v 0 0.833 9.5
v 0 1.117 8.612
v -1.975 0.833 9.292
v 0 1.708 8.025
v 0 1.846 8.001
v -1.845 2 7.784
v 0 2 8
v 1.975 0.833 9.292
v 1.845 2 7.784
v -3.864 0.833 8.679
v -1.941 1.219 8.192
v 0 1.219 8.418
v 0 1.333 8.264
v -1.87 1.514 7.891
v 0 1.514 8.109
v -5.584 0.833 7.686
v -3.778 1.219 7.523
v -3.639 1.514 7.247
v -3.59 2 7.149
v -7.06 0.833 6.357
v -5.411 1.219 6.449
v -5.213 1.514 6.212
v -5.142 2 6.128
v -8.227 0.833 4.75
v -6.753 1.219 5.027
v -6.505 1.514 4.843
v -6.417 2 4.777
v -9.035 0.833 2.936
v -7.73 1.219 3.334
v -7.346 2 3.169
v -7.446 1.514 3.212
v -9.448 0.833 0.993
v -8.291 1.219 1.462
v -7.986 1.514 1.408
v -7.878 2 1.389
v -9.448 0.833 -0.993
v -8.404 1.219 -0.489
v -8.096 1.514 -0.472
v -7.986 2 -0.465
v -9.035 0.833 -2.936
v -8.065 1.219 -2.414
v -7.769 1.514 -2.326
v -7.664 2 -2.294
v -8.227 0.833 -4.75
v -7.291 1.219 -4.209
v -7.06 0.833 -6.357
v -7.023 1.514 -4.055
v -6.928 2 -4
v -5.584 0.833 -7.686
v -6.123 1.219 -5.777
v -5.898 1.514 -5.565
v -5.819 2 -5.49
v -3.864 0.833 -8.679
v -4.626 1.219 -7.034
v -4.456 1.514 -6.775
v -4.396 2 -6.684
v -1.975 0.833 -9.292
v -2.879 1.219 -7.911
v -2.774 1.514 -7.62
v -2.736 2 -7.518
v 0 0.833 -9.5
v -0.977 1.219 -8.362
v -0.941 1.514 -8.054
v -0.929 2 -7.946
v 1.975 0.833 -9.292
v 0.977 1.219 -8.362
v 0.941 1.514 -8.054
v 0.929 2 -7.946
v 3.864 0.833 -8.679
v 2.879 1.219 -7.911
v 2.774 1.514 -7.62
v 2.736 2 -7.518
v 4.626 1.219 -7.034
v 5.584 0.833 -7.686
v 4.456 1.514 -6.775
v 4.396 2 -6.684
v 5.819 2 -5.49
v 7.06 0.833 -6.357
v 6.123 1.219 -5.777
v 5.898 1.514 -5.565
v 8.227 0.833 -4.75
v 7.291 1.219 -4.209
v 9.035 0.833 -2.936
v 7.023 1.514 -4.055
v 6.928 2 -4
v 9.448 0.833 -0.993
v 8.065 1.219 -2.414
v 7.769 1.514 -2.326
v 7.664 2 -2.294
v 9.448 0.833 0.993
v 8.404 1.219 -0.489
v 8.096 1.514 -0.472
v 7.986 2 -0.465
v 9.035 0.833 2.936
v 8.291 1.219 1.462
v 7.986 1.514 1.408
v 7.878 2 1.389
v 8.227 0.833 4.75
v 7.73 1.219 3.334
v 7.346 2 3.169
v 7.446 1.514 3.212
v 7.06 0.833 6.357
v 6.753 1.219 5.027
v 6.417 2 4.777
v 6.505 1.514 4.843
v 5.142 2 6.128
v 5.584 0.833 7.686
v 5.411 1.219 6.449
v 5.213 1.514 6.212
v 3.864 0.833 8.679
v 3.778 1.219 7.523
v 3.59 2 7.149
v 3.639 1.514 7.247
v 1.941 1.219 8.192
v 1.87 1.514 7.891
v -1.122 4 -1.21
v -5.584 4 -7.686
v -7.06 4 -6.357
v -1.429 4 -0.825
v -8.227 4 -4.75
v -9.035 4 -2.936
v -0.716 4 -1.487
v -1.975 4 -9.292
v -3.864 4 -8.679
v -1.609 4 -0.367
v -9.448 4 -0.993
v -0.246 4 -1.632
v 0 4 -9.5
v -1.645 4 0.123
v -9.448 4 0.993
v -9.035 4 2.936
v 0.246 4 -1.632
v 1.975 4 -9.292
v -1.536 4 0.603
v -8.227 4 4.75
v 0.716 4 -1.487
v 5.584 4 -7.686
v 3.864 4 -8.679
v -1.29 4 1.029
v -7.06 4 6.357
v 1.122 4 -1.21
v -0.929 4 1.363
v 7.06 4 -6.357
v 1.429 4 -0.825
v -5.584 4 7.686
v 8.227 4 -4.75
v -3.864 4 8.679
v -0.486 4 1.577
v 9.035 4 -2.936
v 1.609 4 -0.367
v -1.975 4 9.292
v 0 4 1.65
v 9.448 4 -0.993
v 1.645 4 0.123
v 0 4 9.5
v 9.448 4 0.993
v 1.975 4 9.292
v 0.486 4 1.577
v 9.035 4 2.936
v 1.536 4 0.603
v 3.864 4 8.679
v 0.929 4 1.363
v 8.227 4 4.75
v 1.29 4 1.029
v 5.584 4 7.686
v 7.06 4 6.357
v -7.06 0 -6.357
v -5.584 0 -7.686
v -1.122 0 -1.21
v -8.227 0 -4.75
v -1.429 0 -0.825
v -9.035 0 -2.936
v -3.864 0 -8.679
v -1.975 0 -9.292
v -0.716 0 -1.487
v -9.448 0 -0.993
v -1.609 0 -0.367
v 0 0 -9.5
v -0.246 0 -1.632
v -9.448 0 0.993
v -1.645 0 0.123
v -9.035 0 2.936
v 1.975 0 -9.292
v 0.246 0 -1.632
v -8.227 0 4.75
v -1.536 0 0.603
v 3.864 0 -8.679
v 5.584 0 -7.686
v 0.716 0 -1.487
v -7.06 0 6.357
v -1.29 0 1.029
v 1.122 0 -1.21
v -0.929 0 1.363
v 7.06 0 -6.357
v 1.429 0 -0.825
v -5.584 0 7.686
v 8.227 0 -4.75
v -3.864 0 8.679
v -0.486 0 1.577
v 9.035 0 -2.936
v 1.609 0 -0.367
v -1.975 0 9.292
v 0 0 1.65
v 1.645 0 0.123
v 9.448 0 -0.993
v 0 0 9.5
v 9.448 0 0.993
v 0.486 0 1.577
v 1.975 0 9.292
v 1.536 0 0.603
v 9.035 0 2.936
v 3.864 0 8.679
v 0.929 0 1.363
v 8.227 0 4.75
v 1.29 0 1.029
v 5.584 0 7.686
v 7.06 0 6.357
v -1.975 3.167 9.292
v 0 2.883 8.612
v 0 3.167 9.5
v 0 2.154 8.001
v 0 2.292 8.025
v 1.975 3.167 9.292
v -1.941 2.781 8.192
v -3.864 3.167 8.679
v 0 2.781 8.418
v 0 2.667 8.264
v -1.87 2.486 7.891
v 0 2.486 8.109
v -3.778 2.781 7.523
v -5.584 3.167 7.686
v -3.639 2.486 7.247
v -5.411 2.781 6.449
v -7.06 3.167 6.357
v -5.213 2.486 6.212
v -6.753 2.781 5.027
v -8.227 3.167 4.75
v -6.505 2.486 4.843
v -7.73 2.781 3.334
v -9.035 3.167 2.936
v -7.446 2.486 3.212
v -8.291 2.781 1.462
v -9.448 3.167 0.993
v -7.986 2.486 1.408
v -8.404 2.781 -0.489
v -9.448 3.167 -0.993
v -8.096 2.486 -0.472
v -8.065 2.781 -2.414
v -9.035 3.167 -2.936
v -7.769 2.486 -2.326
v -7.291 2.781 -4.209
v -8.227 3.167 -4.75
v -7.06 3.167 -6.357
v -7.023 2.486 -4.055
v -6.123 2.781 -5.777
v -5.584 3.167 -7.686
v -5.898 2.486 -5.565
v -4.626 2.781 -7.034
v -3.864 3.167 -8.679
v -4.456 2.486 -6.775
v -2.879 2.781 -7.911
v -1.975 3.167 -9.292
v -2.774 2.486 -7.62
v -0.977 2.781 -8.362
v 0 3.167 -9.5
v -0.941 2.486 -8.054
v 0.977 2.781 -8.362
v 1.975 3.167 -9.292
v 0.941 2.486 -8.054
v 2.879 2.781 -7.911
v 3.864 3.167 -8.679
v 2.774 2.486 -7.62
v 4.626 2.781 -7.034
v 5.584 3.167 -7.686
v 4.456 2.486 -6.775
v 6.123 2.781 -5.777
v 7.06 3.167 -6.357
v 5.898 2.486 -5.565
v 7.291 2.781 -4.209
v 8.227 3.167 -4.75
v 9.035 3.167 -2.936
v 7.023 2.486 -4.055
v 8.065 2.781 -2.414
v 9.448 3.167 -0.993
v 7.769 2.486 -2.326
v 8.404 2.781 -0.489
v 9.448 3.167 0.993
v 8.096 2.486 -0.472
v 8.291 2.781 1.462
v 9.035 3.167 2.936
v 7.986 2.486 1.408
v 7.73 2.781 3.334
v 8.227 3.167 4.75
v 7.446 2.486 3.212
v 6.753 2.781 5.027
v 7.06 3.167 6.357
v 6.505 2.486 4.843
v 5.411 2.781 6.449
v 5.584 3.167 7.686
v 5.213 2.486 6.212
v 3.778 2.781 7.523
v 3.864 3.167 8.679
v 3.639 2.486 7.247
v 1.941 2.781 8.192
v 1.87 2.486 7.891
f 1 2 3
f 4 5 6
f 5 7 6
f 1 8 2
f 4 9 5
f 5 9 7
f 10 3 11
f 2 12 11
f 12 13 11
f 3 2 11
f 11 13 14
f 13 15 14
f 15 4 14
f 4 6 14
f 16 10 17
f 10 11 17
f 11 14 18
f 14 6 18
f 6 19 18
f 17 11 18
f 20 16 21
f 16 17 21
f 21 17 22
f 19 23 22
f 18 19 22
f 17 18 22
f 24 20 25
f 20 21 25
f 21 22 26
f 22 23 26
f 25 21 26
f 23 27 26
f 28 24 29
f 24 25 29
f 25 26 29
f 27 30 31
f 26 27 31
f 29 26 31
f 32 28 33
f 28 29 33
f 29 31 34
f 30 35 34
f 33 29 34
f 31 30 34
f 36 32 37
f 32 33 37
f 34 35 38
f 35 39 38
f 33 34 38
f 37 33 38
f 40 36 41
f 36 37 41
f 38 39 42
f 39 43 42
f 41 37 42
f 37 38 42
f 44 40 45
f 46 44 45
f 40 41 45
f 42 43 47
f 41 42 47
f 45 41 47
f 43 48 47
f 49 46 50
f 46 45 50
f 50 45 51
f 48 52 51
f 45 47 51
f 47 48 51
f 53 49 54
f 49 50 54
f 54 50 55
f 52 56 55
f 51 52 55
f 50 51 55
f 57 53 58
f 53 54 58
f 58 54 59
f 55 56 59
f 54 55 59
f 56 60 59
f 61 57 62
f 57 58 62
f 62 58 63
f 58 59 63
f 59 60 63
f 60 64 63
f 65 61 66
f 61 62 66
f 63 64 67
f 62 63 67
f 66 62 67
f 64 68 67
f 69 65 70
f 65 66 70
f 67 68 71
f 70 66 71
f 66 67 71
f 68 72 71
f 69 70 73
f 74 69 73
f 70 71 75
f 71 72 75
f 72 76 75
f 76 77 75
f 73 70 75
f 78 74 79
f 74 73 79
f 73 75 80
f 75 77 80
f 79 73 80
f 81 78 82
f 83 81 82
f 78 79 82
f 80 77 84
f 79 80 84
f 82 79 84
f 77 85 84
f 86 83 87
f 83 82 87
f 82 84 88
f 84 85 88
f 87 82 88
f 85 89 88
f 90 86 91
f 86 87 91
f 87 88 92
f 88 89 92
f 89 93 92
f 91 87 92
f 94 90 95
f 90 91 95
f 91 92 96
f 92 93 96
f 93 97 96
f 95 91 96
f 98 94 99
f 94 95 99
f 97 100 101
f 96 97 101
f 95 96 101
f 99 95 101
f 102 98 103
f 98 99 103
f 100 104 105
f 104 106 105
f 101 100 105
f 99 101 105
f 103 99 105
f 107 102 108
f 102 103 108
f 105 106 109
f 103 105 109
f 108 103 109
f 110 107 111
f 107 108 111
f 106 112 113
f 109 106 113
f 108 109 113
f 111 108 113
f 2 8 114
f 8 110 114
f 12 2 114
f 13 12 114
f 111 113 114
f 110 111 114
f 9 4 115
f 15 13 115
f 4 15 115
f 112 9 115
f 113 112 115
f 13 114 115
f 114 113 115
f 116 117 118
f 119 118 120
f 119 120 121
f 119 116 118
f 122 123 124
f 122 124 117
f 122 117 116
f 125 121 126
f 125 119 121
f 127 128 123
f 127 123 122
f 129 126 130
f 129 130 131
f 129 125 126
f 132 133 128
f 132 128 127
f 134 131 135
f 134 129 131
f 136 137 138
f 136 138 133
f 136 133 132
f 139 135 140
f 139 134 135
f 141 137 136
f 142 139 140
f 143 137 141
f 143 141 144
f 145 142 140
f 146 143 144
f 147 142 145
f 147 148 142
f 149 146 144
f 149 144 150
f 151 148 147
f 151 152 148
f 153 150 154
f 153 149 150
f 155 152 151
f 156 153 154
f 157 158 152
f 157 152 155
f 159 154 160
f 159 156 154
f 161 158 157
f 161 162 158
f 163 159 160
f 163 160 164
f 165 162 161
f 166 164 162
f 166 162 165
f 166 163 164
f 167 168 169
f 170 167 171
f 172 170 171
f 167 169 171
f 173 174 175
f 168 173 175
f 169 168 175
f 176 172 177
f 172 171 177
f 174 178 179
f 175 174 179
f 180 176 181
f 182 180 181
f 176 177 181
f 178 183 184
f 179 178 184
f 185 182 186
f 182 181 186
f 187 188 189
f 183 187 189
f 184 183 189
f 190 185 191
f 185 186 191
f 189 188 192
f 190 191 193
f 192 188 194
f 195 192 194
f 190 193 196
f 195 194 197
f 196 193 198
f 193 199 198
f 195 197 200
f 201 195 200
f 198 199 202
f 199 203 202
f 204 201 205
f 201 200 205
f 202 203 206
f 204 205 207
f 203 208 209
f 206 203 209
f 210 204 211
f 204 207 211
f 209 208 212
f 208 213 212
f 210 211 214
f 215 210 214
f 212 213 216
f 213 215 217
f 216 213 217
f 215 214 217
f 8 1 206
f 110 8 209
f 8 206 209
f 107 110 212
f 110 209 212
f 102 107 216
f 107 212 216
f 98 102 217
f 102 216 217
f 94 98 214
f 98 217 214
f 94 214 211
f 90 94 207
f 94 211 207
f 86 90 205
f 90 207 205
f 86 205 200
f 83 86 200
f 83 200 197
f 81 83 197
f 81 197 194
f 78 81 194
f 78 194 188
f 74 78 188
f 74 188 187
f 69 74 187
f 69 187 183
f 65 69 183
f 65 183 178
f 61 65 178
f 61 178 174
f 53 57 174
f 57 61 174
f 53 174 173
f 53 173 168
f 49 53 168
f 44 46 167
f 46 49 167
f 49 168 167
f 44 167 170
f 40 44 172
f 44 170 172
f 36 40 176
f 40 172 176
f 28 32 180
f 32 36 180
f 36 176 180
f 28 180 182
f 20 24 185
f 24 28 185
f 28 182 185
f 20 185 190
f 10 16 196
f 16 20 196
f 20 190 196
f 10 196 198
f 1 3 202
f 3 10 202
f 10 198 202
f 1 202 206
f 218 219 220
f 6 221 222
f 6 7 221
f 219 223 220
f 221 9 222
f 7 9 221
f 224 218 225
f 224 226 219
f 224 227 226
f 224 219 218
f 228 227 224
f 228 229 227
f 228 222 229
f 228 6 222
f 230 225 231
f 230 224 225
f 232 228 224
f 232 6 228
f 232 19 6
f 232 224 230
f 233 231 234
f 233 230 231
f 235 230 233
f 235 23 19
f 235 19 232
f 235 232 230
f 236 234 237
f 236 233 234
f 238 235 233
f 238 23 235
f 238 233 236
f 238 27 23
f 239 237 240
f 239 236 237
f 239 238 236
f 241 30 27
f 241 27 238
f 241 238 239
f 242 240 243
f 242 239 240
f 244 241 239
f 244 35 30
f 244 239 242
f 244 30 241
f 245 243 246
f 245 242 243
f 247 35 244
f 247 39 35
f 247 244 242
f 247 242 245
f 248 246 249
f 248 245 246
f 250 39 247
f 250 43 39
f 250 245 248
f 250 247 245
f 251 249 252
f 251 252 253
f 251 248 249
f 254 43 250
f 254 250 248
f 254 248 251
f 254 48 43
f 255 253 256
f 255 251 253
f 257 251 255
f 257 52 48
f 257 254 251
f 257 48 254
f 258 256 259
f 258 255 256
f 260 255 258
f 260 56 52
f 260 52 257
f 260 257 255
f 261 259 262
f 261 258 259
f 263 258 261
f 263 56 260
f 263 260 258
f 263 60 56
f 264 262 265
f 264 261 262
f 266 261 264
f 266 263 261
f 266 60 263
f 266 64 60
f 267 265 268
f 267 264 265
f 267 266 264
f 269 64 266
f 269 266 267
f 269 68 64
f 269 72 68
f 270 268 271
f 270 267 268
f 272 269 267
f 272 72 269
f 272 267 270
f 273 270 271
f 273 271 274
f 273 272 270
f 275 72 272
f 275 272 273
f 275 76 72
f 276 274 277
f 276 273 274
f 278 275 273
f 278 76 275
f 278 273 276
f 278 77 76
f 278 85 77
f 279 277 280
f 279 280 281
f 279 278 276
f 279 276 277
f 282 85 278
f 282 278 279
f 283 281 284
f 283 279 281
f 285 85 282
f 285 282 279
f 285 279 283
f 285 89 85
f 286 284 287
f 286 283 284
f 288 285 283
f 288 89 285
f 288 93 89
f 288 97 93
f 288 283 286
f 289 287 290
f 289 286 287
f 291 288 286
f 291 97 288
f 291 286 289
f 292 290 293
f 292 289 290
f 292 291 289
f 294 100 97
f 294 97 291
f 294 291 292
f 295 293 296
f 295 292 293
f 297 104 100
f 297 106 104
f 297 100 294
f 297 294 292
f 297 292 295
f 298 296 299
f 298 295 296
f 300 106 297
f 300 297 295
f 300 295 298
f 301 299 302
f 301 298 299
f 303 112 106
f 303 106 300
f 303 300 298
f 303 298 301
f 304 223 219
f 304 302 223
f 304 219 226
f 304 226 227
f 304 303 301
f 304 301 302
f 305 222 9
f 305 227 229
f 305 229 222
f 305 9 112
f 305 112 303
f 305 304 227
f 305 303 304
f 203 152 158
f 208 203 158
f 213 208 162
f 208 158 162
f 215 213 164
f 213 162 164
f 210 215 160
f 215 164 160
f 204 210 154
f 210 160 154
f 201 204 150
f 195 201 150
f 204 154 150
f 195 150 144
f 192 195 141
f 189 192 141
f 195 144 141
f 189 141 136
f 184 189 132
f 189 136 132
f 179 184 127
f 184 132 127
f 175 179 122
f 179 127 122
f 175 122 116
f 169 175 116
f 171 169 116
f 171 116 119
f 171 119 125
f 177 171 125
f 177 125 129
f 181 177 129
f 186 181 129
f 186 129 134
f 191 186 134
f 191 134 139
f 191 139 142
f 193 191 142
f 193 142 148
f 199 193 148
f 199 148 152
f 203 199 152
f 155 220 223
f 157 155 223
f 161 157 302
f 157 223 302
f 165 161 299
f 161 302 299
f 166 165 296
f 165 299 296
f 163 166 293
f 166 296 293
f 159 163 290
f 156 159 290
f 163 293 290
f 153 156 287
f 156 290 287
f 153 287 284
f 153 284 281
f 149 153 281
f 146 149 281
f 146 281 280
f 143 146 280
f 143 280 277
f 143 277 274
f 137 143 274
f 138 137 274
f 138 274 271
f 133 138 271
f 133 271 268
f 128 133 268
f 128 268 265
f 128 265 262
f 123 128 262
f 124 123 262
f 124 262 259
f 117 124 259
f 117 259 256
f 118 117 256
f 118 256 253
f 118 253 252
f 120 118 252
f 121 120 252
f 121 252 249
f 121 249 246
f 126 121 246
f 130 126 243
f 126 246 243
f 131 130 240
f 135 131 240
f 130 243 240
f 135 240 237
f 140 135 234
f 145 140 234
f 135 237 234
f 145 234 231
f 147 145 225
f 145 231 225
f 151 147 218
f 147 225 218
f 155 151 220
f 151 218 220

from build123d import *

# Parameters (mm, degrees)
SKETCH1_R           = 9.5
BOSS_EXTRUDE1_DEPTH = 4
SKETCH3_R           = 1.65
CUT_EXTRUDE1_DEPTH  = 15.017845904


with BuildPart() as part:
    # Sketch1 → Boss-Extrude1 (new body)
    with BuildSketch(Plane(origin=(0, 0, 0), x_dir=(1, 0, 0), z_dir=(0, 1, 0))):
        with Locations(Location((0, 0, 0), (0, 0, 270))):
            Circle(SKETCH1_R)
    extrude(amount=BOSS_EXTRUDE1_DEPTH)

    # Sketch2 → Cut-Revolve3 (revolve, cut)
    with BuildSketch(Plane.XY, mode=Mode.PRIVATE) as cut_revolve3_sk:
        with BuildLine():
            Line((-9.5, 3.167174781), (-9.5, 0.832825219))
            add(Edge.make_bspline(
                [(-9.5, 0.832825219), (-8.911003923, 1.01519245), (-7.940181452, 1.15692307), (-8, 2)],
                knots=[0, 0, 0, 0, 1, 1, 1, 1], degree=3))
            add(Edge.make_bspline(
                [(-9.5, 3.167174781), (-8.911003923, 2.98480755), (-7.940181452, 2.84307693), (-8, 2)],
                knots=[0, 0, 0, 0, 1, 1, 1, 1], degree=3))
        make_face()
    revolve(cut_revolve3_sk.sketch.rotate(Axis((0, 4.2, 0), (0, -1, 0)), 270), axis=Axis((0, 4.2, 0), (0, -1, 0)), mode=Mode.SUBTRACT)

    # Sketch3 → Cut-Extrude1 (cut, through all)
    with BuildSketch(Plane(origin=(0, 4, 0), x_dir=(1, 0, 0), z_dir=(0, 1, 0))):
        with Locations(Location((0, 0, 0), (0, 0, 270))):
            Circle(SKETCH3_R)
    extrude(amount=-CUT_EXTRUDE1_DEPTH, mode=Mode.SUBTRACT)


solid = part.part
